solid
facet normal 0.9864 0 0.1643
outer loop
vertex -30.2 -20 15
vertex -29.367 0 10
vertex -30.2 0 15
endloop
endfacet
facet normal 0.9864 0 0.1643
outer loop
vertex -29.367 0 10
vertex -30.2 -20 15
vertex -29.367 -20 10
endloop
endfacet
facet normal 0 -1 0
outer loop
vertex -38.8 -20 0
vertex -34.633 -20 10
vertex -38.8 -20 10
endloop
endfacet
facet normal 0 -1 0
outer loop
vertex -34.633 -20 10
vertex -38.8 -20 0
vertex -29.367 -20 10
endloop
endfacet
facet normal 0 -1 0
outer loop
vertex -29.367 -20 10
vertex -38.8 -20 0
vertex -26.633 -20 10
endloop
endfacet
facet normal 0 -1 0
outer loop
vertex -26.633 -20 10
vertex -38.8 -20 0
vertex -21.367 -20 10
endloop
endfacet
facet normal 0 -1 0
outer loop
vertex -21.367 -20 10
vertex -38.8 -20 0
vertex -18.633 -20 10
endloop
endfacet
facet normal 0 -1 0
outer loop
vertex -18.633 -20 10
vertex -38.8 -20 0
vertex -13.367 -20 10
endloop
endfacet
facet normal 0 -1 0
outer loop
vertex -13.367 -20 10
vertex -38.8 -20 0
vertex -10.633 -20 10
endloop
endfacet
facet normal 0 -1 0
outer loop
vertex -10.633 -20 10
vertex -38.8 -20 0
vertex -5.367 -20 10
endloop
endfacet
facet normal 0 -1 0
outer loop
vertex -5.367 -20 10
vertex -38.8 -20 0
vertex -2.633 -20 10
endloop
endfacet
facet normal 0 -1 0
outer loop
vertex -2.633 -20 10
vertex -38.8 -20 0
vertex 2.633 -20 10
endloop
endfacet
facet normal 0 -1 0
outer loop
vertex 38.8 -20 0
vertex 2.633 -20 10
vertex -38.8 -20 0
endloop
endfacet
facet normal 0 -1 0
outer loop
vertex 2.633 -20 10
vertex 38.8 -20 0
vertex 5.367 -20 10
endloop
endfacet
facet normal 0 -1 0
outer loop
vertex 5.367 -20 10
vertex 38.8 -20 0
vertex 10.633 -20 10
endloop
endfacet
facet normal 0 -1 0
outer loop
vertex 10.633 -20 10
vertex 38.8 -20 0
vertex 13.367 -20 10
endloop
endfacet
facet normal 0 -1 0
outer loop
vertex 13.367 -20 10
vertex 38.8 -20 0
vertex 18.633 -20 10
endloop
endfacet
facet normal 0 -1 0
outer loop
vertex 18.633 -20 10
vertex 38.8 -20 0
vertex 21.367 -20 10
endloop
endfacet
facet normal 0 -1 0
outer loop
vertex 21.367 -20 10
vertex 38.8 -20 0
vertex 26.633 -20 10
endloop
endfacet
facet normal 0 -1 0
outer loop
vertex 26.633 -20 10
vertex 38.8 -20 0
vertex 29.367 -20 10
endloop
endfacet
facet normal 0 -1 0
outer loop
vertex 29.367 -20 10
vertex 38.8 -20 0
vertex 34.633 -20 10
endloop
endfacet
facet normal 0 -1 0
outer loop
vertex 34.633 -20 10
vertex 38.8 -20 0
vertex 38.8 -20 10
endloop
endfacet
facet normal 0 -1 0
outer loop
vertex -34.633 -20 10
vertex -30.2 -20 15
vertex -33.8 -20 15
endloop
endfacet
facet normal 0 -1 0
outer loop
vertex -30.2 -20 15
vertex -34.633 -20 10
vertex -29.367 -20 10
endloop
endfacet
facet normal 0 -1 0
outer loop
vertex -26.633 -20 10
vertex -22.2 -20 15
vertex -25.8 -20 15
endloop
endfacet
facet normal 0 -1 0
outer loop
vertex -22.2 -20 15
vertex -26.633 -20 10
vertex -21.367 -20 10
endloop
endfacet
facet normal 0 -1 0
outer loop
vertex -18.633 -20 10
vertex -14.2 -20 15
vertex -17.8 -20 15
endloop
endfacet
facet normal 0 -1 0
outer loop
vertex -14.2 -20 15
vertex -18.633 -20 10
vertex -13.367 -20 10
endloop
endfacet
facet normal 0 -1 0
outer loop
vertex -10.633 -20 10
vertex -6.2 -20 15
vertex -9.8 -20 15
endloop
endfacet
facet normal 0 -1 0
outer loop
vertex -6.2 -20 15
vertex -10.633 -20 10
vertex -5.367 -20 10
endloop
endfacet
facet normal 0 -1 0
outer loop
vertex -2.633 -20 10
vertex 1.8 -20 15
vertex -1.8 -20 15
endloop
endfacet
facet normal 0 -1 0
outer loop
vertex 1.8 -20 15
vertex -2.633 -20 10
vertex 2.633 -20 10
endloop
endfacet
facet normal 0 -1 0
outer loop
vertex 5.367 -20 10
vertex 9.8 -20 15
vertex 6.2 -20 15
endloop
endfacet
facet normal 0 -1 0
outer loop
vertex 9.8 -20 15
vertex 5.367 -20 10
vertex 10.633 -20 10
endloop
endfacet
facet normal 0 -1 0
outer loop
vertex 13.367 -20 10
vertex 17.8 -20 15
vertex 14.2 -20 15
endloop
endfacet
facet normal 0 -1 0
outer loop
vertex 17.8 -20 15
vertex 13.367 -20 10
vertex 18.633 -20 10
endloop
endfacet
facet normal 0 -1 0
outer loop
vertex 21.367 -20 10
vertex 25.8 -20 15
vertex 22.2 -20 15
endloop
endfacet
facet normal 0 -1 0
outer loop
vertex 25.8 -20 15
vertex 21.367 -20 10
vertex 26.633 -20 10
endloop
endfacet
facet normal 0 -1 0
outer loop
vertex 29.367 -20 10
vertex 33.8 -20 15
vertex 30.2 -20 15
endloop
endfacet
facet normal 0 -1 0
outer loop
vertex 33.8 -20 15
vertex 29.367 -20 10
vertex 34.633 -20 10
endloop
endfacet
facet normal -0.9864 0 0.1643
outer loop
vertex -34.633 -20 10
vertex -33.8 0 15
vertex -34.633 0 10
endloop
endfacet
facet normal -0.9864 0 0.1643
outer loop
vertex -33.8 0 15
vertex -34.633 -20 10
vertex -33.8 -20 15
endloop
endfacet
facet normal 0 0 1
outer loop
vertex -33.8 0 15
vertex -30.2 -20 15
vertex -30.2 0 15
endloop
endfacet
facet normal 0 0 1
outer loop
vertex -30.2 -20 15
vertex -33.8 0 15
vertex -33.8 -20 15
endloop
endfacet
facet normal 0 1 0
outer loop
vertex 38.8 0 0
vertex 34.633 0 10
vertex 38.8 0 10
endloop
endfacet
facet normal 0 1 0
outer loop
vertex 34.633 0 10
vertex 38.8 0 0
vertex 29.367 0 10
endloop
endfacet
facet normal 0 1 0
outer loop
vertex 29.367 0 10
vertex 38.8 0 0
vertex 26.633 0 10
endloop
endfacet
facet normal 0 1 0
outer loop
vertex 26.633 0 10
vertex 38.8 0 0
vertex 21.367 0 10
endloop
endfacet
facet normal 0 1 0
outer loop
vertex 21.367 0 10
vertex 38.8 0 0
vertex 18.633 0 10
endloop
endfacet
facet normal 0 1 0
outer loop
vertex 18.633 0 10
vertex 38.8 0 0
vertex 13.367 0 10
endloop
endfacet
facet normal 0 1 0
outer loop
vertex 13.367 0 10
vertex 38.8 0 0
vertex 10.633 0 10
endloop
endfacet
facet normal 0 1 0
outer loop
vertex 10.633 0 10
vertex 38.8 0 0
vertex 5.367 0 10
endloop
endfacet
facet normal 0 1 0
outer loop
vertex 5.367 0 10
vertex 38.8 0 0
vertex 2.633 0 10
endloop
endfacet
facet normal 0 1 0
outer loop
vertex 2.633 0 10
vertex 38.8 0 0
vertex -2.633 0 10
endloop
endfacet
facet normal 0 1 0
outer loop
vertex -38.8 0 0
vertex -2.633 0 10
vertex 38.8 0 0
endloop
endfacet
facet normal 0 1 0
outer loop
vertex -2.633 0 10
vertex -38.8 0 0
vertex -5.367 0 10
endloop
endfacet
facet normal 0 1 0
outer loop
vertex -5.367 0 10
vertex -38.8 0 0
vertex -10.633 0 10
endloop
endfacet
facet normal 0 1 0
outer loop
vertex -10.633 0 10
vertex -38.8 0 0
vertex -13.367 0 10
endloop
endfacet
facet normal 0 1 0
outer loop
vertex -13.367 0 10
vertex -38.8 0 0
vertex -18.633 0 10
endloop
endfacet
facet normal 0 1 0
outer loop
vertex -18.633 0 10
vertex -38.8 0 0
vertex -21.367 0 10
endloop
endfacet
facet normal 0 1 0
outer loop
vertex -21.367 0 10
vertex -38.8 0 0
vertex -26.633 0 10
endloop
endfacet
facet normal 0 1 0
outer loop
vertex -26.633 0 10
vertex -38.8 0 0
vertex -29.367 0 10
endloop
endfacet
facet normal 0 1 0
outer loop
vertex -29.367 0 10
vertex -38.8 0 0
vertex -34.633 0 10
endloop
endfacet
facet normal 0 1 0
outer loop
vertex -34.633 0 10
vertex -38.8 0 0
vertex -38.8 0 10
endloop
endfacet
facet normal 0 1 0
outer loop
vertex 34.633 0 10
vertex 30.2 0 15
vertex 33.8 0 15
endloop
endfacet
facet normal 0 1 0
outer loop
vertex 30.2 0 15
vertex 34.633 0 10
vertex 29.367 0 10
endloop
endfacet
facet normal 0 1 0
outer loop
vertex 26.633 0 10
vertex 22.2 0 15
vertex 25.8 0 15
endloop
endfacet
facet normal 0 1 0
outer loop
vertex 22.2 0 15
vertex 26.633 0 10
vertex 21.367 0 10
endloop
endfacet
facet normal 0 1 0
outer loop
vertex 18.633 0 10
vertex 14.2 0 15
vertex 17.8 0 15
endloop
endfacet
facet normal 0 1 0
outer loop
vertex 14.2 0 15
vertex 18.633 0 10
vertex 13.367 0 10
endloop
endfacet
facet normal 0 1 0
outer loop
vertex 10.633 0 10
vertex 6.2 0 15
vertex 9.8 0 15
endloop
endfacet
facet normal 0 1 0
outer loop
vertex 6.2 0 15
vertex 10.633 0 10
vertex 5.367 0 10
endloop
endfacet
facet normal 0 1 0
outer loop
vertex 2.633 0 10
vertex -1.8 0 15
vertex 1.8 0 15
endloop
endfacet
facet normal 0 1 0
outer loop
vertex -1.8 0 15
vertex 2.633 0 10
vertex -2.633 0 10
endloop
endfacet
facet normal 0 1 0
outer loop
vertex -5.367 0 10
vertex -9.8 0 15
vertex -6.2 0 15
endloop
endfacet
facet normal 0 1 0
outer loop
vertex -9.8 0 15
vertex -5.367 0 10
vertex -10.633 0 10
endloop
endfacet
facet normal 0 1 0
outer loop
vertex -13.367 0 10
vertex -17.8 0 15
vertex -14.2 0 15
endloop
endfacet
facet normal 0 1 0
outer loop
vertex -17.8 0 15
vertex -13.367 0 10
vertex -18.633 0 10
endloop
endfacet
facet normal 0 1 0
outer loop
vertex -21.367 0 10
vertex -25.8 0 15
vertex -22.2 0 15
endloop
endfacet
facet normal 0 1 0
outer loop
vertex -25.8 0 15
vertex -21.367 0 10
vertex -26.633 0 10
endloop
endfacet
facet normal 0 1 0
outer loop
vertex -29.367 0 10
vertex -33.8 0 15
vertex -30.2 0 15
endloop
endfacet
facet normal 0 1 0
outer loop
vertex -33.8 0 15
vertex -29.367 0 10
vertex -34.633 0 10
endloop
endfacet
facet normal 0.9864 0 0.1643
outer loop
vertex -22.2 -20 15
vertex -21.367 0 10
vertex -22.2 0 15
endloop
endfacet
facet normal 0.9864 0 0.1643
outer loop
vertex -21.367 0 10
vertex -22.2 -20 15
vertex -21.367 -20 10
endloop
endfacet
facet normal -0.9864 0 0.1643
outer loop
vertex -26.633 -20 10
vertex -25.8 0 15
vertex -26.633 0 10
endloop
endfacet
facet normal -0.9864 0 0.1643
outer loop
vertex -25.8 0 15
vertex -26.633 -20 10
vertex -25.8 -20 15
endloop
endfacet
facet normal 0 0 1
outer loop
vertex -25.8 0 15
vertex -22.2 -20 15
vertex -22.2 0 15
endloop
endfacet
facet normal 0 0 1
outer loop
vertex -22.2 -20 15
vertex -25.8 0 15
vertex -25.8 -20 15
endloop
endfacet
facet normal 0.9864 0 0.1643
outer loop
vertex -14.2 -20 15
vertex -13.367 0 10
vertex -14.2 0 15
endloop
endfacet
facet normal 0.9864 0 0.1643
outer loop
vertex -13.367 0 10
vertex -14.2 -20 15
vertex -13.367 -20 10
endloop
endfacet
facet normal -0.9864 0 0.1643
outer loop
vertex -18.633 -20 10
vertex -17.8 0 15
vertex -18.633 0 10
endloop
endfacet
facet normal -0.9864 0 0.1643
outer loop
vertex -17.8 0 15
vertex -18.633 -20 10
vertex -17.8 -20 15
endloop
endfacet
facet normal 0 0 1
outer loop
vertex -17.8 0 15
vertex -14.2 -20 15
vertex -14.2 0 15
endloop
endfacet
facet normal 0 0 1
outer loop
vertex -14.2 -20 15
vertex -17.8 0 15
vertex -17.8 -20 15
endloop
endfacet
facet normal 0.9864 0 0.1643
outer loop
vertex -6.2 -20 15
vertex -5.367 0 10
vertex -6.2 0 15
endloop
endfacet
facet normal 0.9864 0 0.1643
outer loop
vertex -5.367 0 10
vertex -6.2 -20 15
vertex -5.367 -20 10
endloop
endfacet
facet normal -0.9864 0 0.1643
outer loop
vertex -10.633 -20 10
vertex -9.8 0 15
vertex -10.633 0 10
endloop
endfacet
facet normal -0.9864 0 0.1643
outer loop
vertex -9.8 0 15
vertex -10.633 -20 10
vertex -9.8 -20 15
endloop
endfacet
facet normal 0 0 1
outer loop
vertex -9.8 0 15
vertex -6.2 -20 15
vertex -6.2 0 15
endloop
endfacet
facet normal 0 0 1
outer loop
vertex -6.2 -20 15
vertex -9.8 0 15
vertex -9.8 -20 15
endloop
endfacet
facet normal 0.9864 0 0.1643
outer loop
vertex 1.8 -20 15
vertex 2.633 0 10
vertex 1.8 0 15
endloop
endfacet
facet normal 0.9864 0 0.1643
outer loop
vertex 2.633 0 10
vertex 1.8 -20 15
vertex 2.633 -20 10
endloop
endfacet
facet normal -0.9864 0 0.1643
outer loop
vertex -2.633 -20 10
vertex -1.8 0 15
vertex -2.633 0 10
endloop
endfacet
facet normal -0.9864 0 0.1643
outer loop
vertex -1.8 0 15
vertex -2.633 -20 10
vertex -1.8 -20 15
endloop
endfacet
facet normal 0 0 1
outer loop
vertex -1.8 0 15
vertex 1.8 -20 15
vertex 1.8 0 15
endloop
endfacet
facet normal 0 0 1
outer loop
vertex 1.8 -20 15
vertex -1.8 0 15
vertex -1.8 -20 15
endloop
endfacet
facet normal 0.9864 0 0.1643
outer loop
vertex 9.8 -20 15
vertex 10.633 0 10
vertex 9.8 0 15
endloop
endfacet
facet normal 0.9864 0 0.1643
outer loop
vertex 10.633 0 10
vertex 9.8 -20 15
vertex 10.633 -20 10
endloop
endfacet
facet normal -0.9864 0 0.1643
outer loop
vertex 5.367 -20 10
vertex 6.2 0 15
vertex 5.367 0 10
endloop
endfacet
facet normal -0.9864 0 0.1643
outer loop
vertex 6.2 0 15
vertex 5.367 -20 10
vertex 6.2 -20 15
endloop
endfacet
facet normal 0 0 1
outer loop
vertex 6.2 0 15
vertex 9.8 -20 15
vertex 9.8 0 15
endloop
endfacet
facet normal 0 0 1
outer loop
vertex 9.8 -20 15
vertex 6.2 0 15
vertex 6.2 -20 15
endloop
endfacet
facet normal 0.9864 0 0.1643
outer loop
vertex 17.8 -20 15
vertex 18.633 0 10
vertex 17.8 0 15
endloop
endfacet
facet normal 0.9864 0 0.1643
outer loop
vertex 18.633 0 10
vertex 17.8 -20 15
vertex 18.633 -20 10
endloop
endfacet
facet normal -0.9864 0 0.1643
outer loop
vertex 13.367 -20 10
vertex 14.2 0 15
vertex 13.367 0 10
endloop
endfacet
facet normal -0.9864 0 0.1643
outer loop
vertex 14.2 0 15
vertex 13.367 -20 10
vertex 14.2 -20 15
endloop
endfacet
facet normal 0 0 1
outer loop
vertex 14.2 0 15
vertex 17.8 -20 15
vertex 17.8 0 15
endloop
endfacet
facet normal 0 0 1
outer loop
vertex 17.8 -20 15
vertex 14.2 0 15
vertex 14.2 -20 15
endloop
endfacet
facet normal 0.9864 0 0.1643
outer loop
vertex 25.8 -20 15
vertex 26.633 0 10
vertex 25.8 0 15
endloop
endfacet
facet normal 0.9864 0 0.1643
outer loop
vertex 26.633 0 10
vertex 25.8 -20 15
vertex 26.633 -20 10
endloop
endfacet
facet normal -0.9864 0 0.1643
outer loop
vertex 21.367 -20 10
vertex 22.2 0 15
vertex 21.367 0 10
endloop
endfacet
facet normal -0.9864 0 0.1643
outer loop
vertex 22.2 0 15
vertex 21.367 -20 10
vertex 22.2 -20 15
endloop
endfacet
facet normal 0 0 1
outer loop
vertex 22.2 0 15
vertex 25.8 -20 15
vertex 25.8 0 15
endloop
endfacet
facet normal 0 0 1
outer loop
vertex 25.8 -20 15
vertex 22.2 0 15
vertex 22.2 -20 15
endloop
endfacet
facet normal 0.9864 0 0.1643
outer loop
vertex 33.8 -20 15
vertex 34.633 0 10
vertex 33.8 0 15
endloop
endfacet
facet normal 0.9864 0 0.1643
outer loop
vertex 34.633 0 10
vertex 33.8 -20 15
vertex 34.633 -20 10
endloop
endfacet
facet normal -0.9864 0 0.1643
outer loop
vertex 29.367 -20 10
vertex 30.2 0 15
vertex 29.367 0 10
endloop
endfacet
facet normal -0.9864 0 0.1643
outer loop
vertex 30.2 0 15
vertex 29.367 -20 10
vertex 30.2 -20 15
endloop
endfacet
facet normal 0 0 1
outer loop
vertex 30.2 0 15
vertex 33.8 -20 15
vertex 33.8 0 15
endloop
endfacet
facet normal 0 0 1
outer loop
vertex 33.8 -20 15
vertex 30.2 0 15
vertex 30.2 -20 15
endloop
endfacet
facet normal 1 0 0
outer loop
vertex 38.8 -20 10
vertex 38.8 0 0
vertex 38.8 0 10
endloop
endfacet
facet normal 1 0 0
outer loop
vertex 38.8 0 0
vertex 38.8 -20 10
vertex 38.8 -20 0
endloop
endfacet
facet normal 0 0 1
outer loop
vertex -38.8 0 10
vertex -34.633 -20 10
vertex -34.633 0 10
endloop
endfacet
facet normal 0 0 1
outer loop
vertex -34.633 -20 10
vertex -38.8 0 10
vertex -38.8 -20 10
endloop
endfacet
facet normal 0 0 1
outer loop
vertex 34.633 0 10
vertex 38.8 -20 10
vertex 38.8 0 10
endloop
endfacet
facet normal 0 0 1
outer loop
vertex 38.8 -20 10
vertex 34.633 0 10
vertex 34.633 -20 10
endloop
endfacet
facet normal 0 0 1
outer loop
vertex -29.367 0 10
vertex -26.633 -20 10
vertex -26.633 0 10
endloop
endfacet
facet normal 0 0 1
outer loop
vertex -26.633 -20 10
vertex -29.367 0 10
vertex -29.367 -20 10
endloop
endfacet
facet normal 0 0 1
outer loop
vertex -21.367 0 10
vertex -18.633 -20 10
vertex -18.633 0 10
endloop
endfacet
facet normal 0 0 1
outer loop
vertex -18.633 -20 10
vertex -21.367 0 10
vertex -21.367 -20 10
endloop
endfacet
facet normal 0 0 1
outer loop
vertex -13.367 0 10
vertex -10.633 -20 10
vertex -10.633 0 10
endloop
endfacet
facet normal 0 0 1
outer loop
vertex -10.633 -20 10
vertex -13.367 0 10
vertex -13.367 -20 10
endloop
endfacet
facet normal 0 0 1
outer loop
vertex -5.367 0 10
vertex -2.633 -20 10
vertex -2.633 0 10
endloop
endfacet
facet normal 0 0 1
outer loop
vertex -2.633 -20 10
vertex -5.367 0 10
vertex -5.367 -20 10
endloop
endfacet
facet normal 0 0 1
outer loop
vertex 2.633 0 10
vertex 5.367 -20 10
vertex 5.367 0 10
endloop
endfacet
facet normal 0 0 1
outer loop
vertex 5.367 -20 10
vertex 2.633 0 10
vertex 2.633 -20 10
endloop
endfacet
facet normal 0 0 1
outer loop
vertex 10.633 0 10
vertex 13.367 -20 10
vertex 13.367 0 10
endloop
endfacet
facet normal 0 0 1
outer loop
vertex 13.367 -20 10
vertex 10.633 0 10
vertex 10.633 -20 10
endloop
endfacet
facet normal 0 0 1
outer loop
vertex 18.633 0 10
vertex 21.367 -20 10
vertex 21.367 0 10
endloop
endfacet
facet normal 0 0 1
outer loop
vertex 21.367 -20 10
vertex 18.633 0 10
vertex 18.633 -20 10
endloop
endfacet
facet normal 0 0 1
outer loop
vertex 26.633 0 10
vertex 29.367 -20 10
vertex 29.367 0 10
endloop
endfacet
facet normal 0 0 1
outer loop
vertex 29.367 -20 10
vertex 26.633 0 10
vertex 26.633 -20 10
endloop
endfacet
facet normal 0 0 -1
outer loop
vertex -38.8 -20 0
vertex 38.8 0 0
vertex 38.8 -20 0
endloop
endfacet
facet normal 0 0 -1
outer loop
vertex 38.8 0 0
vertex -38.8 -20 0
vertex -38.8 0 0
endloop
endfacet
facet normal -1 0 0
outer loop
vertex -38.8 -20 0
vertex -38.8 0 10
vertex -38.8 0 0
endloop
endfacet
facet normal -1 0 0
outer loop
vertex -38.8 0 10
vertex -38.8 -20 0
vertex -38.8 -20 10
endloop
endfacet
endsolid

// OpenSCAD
$fn = 32;

// ----------------------------------------------------------------------
// Toothed rack, 9 teeth
// 8 mm pitch, 5 mm teeth
// ----------------------------------------------------------------------

// --- parameters (mm) ---
bar_w = 20;      // bar width (Y)
seat_tol = 0.1;  // tolerance at the seating features
free_tol = 0.3;  // general tolerance on the free sizes
bar_h = 10;      // bar height (Z)
teeth = 9;       // number of teeth
pitch = 8;       // tooth pitch
tooth_h = 5;     // tooth height above the bar
root_w = 5.6;    // tooth width at the root
crest_w = 3.6;   // tooth width at the crest

// --- derived feature positions (mm) ---
span = (teeth - 1) * pitch;  // = 64   distance between the outer teeth
bar_l = span + root_w + 8;   // = 77.6   bar length: teeth plus 4 mm at each end
tooth_x = -span / 2;         // = -32   X of the first tooth
height = bar_h + tooth_h;    // = 15   overall height
feature_centers = [
  [tooth_x + 0 * pitch, -bar_w / 2],
  [tooth_x + 1 * pitch, -bar_w / 2],
  [tooth_x + 2 * pitch, -bar_w / 2],
  [tooth_x + 3 * pitch, -bar_w / 2],
  [tooth_x + 4 * pitch, -bar_w / 2],
  [tooth_x + 5 * pitch, -bar_w / 2],
  [tooth_x + 6 * pitch, -bar_w / 2],
  [tooth_x + 7 * pitch, -bar_w / 2],
  [tooth_x + 8 * pitch, -bar_w / 2]
];   // tooth centre line, drives the tooth loop

// bar with a rack of teeth, one extruded trapezoium per centre
module rack_tooth() {
  linear_extrude(height = bar_w)
    polygon(points = [
      [0, 0],
      [root_w, 0],
      [root_w / 2 + crest_w / 2, tooth_h + 1],
      [root_w / 2 - crest_w / 2, tooth_h + 1]
    ]);
}

union() {
  translate([-bar_l / 2, -bar_w, 0]) cube([bar_l, bar_w, bar_h]);
  for (centre = feature_centers)
    translate([centre[0] - root_w / 2, 0, bar_h - 1]) rotate([90, 0, 0]) rack_tooth();
}
